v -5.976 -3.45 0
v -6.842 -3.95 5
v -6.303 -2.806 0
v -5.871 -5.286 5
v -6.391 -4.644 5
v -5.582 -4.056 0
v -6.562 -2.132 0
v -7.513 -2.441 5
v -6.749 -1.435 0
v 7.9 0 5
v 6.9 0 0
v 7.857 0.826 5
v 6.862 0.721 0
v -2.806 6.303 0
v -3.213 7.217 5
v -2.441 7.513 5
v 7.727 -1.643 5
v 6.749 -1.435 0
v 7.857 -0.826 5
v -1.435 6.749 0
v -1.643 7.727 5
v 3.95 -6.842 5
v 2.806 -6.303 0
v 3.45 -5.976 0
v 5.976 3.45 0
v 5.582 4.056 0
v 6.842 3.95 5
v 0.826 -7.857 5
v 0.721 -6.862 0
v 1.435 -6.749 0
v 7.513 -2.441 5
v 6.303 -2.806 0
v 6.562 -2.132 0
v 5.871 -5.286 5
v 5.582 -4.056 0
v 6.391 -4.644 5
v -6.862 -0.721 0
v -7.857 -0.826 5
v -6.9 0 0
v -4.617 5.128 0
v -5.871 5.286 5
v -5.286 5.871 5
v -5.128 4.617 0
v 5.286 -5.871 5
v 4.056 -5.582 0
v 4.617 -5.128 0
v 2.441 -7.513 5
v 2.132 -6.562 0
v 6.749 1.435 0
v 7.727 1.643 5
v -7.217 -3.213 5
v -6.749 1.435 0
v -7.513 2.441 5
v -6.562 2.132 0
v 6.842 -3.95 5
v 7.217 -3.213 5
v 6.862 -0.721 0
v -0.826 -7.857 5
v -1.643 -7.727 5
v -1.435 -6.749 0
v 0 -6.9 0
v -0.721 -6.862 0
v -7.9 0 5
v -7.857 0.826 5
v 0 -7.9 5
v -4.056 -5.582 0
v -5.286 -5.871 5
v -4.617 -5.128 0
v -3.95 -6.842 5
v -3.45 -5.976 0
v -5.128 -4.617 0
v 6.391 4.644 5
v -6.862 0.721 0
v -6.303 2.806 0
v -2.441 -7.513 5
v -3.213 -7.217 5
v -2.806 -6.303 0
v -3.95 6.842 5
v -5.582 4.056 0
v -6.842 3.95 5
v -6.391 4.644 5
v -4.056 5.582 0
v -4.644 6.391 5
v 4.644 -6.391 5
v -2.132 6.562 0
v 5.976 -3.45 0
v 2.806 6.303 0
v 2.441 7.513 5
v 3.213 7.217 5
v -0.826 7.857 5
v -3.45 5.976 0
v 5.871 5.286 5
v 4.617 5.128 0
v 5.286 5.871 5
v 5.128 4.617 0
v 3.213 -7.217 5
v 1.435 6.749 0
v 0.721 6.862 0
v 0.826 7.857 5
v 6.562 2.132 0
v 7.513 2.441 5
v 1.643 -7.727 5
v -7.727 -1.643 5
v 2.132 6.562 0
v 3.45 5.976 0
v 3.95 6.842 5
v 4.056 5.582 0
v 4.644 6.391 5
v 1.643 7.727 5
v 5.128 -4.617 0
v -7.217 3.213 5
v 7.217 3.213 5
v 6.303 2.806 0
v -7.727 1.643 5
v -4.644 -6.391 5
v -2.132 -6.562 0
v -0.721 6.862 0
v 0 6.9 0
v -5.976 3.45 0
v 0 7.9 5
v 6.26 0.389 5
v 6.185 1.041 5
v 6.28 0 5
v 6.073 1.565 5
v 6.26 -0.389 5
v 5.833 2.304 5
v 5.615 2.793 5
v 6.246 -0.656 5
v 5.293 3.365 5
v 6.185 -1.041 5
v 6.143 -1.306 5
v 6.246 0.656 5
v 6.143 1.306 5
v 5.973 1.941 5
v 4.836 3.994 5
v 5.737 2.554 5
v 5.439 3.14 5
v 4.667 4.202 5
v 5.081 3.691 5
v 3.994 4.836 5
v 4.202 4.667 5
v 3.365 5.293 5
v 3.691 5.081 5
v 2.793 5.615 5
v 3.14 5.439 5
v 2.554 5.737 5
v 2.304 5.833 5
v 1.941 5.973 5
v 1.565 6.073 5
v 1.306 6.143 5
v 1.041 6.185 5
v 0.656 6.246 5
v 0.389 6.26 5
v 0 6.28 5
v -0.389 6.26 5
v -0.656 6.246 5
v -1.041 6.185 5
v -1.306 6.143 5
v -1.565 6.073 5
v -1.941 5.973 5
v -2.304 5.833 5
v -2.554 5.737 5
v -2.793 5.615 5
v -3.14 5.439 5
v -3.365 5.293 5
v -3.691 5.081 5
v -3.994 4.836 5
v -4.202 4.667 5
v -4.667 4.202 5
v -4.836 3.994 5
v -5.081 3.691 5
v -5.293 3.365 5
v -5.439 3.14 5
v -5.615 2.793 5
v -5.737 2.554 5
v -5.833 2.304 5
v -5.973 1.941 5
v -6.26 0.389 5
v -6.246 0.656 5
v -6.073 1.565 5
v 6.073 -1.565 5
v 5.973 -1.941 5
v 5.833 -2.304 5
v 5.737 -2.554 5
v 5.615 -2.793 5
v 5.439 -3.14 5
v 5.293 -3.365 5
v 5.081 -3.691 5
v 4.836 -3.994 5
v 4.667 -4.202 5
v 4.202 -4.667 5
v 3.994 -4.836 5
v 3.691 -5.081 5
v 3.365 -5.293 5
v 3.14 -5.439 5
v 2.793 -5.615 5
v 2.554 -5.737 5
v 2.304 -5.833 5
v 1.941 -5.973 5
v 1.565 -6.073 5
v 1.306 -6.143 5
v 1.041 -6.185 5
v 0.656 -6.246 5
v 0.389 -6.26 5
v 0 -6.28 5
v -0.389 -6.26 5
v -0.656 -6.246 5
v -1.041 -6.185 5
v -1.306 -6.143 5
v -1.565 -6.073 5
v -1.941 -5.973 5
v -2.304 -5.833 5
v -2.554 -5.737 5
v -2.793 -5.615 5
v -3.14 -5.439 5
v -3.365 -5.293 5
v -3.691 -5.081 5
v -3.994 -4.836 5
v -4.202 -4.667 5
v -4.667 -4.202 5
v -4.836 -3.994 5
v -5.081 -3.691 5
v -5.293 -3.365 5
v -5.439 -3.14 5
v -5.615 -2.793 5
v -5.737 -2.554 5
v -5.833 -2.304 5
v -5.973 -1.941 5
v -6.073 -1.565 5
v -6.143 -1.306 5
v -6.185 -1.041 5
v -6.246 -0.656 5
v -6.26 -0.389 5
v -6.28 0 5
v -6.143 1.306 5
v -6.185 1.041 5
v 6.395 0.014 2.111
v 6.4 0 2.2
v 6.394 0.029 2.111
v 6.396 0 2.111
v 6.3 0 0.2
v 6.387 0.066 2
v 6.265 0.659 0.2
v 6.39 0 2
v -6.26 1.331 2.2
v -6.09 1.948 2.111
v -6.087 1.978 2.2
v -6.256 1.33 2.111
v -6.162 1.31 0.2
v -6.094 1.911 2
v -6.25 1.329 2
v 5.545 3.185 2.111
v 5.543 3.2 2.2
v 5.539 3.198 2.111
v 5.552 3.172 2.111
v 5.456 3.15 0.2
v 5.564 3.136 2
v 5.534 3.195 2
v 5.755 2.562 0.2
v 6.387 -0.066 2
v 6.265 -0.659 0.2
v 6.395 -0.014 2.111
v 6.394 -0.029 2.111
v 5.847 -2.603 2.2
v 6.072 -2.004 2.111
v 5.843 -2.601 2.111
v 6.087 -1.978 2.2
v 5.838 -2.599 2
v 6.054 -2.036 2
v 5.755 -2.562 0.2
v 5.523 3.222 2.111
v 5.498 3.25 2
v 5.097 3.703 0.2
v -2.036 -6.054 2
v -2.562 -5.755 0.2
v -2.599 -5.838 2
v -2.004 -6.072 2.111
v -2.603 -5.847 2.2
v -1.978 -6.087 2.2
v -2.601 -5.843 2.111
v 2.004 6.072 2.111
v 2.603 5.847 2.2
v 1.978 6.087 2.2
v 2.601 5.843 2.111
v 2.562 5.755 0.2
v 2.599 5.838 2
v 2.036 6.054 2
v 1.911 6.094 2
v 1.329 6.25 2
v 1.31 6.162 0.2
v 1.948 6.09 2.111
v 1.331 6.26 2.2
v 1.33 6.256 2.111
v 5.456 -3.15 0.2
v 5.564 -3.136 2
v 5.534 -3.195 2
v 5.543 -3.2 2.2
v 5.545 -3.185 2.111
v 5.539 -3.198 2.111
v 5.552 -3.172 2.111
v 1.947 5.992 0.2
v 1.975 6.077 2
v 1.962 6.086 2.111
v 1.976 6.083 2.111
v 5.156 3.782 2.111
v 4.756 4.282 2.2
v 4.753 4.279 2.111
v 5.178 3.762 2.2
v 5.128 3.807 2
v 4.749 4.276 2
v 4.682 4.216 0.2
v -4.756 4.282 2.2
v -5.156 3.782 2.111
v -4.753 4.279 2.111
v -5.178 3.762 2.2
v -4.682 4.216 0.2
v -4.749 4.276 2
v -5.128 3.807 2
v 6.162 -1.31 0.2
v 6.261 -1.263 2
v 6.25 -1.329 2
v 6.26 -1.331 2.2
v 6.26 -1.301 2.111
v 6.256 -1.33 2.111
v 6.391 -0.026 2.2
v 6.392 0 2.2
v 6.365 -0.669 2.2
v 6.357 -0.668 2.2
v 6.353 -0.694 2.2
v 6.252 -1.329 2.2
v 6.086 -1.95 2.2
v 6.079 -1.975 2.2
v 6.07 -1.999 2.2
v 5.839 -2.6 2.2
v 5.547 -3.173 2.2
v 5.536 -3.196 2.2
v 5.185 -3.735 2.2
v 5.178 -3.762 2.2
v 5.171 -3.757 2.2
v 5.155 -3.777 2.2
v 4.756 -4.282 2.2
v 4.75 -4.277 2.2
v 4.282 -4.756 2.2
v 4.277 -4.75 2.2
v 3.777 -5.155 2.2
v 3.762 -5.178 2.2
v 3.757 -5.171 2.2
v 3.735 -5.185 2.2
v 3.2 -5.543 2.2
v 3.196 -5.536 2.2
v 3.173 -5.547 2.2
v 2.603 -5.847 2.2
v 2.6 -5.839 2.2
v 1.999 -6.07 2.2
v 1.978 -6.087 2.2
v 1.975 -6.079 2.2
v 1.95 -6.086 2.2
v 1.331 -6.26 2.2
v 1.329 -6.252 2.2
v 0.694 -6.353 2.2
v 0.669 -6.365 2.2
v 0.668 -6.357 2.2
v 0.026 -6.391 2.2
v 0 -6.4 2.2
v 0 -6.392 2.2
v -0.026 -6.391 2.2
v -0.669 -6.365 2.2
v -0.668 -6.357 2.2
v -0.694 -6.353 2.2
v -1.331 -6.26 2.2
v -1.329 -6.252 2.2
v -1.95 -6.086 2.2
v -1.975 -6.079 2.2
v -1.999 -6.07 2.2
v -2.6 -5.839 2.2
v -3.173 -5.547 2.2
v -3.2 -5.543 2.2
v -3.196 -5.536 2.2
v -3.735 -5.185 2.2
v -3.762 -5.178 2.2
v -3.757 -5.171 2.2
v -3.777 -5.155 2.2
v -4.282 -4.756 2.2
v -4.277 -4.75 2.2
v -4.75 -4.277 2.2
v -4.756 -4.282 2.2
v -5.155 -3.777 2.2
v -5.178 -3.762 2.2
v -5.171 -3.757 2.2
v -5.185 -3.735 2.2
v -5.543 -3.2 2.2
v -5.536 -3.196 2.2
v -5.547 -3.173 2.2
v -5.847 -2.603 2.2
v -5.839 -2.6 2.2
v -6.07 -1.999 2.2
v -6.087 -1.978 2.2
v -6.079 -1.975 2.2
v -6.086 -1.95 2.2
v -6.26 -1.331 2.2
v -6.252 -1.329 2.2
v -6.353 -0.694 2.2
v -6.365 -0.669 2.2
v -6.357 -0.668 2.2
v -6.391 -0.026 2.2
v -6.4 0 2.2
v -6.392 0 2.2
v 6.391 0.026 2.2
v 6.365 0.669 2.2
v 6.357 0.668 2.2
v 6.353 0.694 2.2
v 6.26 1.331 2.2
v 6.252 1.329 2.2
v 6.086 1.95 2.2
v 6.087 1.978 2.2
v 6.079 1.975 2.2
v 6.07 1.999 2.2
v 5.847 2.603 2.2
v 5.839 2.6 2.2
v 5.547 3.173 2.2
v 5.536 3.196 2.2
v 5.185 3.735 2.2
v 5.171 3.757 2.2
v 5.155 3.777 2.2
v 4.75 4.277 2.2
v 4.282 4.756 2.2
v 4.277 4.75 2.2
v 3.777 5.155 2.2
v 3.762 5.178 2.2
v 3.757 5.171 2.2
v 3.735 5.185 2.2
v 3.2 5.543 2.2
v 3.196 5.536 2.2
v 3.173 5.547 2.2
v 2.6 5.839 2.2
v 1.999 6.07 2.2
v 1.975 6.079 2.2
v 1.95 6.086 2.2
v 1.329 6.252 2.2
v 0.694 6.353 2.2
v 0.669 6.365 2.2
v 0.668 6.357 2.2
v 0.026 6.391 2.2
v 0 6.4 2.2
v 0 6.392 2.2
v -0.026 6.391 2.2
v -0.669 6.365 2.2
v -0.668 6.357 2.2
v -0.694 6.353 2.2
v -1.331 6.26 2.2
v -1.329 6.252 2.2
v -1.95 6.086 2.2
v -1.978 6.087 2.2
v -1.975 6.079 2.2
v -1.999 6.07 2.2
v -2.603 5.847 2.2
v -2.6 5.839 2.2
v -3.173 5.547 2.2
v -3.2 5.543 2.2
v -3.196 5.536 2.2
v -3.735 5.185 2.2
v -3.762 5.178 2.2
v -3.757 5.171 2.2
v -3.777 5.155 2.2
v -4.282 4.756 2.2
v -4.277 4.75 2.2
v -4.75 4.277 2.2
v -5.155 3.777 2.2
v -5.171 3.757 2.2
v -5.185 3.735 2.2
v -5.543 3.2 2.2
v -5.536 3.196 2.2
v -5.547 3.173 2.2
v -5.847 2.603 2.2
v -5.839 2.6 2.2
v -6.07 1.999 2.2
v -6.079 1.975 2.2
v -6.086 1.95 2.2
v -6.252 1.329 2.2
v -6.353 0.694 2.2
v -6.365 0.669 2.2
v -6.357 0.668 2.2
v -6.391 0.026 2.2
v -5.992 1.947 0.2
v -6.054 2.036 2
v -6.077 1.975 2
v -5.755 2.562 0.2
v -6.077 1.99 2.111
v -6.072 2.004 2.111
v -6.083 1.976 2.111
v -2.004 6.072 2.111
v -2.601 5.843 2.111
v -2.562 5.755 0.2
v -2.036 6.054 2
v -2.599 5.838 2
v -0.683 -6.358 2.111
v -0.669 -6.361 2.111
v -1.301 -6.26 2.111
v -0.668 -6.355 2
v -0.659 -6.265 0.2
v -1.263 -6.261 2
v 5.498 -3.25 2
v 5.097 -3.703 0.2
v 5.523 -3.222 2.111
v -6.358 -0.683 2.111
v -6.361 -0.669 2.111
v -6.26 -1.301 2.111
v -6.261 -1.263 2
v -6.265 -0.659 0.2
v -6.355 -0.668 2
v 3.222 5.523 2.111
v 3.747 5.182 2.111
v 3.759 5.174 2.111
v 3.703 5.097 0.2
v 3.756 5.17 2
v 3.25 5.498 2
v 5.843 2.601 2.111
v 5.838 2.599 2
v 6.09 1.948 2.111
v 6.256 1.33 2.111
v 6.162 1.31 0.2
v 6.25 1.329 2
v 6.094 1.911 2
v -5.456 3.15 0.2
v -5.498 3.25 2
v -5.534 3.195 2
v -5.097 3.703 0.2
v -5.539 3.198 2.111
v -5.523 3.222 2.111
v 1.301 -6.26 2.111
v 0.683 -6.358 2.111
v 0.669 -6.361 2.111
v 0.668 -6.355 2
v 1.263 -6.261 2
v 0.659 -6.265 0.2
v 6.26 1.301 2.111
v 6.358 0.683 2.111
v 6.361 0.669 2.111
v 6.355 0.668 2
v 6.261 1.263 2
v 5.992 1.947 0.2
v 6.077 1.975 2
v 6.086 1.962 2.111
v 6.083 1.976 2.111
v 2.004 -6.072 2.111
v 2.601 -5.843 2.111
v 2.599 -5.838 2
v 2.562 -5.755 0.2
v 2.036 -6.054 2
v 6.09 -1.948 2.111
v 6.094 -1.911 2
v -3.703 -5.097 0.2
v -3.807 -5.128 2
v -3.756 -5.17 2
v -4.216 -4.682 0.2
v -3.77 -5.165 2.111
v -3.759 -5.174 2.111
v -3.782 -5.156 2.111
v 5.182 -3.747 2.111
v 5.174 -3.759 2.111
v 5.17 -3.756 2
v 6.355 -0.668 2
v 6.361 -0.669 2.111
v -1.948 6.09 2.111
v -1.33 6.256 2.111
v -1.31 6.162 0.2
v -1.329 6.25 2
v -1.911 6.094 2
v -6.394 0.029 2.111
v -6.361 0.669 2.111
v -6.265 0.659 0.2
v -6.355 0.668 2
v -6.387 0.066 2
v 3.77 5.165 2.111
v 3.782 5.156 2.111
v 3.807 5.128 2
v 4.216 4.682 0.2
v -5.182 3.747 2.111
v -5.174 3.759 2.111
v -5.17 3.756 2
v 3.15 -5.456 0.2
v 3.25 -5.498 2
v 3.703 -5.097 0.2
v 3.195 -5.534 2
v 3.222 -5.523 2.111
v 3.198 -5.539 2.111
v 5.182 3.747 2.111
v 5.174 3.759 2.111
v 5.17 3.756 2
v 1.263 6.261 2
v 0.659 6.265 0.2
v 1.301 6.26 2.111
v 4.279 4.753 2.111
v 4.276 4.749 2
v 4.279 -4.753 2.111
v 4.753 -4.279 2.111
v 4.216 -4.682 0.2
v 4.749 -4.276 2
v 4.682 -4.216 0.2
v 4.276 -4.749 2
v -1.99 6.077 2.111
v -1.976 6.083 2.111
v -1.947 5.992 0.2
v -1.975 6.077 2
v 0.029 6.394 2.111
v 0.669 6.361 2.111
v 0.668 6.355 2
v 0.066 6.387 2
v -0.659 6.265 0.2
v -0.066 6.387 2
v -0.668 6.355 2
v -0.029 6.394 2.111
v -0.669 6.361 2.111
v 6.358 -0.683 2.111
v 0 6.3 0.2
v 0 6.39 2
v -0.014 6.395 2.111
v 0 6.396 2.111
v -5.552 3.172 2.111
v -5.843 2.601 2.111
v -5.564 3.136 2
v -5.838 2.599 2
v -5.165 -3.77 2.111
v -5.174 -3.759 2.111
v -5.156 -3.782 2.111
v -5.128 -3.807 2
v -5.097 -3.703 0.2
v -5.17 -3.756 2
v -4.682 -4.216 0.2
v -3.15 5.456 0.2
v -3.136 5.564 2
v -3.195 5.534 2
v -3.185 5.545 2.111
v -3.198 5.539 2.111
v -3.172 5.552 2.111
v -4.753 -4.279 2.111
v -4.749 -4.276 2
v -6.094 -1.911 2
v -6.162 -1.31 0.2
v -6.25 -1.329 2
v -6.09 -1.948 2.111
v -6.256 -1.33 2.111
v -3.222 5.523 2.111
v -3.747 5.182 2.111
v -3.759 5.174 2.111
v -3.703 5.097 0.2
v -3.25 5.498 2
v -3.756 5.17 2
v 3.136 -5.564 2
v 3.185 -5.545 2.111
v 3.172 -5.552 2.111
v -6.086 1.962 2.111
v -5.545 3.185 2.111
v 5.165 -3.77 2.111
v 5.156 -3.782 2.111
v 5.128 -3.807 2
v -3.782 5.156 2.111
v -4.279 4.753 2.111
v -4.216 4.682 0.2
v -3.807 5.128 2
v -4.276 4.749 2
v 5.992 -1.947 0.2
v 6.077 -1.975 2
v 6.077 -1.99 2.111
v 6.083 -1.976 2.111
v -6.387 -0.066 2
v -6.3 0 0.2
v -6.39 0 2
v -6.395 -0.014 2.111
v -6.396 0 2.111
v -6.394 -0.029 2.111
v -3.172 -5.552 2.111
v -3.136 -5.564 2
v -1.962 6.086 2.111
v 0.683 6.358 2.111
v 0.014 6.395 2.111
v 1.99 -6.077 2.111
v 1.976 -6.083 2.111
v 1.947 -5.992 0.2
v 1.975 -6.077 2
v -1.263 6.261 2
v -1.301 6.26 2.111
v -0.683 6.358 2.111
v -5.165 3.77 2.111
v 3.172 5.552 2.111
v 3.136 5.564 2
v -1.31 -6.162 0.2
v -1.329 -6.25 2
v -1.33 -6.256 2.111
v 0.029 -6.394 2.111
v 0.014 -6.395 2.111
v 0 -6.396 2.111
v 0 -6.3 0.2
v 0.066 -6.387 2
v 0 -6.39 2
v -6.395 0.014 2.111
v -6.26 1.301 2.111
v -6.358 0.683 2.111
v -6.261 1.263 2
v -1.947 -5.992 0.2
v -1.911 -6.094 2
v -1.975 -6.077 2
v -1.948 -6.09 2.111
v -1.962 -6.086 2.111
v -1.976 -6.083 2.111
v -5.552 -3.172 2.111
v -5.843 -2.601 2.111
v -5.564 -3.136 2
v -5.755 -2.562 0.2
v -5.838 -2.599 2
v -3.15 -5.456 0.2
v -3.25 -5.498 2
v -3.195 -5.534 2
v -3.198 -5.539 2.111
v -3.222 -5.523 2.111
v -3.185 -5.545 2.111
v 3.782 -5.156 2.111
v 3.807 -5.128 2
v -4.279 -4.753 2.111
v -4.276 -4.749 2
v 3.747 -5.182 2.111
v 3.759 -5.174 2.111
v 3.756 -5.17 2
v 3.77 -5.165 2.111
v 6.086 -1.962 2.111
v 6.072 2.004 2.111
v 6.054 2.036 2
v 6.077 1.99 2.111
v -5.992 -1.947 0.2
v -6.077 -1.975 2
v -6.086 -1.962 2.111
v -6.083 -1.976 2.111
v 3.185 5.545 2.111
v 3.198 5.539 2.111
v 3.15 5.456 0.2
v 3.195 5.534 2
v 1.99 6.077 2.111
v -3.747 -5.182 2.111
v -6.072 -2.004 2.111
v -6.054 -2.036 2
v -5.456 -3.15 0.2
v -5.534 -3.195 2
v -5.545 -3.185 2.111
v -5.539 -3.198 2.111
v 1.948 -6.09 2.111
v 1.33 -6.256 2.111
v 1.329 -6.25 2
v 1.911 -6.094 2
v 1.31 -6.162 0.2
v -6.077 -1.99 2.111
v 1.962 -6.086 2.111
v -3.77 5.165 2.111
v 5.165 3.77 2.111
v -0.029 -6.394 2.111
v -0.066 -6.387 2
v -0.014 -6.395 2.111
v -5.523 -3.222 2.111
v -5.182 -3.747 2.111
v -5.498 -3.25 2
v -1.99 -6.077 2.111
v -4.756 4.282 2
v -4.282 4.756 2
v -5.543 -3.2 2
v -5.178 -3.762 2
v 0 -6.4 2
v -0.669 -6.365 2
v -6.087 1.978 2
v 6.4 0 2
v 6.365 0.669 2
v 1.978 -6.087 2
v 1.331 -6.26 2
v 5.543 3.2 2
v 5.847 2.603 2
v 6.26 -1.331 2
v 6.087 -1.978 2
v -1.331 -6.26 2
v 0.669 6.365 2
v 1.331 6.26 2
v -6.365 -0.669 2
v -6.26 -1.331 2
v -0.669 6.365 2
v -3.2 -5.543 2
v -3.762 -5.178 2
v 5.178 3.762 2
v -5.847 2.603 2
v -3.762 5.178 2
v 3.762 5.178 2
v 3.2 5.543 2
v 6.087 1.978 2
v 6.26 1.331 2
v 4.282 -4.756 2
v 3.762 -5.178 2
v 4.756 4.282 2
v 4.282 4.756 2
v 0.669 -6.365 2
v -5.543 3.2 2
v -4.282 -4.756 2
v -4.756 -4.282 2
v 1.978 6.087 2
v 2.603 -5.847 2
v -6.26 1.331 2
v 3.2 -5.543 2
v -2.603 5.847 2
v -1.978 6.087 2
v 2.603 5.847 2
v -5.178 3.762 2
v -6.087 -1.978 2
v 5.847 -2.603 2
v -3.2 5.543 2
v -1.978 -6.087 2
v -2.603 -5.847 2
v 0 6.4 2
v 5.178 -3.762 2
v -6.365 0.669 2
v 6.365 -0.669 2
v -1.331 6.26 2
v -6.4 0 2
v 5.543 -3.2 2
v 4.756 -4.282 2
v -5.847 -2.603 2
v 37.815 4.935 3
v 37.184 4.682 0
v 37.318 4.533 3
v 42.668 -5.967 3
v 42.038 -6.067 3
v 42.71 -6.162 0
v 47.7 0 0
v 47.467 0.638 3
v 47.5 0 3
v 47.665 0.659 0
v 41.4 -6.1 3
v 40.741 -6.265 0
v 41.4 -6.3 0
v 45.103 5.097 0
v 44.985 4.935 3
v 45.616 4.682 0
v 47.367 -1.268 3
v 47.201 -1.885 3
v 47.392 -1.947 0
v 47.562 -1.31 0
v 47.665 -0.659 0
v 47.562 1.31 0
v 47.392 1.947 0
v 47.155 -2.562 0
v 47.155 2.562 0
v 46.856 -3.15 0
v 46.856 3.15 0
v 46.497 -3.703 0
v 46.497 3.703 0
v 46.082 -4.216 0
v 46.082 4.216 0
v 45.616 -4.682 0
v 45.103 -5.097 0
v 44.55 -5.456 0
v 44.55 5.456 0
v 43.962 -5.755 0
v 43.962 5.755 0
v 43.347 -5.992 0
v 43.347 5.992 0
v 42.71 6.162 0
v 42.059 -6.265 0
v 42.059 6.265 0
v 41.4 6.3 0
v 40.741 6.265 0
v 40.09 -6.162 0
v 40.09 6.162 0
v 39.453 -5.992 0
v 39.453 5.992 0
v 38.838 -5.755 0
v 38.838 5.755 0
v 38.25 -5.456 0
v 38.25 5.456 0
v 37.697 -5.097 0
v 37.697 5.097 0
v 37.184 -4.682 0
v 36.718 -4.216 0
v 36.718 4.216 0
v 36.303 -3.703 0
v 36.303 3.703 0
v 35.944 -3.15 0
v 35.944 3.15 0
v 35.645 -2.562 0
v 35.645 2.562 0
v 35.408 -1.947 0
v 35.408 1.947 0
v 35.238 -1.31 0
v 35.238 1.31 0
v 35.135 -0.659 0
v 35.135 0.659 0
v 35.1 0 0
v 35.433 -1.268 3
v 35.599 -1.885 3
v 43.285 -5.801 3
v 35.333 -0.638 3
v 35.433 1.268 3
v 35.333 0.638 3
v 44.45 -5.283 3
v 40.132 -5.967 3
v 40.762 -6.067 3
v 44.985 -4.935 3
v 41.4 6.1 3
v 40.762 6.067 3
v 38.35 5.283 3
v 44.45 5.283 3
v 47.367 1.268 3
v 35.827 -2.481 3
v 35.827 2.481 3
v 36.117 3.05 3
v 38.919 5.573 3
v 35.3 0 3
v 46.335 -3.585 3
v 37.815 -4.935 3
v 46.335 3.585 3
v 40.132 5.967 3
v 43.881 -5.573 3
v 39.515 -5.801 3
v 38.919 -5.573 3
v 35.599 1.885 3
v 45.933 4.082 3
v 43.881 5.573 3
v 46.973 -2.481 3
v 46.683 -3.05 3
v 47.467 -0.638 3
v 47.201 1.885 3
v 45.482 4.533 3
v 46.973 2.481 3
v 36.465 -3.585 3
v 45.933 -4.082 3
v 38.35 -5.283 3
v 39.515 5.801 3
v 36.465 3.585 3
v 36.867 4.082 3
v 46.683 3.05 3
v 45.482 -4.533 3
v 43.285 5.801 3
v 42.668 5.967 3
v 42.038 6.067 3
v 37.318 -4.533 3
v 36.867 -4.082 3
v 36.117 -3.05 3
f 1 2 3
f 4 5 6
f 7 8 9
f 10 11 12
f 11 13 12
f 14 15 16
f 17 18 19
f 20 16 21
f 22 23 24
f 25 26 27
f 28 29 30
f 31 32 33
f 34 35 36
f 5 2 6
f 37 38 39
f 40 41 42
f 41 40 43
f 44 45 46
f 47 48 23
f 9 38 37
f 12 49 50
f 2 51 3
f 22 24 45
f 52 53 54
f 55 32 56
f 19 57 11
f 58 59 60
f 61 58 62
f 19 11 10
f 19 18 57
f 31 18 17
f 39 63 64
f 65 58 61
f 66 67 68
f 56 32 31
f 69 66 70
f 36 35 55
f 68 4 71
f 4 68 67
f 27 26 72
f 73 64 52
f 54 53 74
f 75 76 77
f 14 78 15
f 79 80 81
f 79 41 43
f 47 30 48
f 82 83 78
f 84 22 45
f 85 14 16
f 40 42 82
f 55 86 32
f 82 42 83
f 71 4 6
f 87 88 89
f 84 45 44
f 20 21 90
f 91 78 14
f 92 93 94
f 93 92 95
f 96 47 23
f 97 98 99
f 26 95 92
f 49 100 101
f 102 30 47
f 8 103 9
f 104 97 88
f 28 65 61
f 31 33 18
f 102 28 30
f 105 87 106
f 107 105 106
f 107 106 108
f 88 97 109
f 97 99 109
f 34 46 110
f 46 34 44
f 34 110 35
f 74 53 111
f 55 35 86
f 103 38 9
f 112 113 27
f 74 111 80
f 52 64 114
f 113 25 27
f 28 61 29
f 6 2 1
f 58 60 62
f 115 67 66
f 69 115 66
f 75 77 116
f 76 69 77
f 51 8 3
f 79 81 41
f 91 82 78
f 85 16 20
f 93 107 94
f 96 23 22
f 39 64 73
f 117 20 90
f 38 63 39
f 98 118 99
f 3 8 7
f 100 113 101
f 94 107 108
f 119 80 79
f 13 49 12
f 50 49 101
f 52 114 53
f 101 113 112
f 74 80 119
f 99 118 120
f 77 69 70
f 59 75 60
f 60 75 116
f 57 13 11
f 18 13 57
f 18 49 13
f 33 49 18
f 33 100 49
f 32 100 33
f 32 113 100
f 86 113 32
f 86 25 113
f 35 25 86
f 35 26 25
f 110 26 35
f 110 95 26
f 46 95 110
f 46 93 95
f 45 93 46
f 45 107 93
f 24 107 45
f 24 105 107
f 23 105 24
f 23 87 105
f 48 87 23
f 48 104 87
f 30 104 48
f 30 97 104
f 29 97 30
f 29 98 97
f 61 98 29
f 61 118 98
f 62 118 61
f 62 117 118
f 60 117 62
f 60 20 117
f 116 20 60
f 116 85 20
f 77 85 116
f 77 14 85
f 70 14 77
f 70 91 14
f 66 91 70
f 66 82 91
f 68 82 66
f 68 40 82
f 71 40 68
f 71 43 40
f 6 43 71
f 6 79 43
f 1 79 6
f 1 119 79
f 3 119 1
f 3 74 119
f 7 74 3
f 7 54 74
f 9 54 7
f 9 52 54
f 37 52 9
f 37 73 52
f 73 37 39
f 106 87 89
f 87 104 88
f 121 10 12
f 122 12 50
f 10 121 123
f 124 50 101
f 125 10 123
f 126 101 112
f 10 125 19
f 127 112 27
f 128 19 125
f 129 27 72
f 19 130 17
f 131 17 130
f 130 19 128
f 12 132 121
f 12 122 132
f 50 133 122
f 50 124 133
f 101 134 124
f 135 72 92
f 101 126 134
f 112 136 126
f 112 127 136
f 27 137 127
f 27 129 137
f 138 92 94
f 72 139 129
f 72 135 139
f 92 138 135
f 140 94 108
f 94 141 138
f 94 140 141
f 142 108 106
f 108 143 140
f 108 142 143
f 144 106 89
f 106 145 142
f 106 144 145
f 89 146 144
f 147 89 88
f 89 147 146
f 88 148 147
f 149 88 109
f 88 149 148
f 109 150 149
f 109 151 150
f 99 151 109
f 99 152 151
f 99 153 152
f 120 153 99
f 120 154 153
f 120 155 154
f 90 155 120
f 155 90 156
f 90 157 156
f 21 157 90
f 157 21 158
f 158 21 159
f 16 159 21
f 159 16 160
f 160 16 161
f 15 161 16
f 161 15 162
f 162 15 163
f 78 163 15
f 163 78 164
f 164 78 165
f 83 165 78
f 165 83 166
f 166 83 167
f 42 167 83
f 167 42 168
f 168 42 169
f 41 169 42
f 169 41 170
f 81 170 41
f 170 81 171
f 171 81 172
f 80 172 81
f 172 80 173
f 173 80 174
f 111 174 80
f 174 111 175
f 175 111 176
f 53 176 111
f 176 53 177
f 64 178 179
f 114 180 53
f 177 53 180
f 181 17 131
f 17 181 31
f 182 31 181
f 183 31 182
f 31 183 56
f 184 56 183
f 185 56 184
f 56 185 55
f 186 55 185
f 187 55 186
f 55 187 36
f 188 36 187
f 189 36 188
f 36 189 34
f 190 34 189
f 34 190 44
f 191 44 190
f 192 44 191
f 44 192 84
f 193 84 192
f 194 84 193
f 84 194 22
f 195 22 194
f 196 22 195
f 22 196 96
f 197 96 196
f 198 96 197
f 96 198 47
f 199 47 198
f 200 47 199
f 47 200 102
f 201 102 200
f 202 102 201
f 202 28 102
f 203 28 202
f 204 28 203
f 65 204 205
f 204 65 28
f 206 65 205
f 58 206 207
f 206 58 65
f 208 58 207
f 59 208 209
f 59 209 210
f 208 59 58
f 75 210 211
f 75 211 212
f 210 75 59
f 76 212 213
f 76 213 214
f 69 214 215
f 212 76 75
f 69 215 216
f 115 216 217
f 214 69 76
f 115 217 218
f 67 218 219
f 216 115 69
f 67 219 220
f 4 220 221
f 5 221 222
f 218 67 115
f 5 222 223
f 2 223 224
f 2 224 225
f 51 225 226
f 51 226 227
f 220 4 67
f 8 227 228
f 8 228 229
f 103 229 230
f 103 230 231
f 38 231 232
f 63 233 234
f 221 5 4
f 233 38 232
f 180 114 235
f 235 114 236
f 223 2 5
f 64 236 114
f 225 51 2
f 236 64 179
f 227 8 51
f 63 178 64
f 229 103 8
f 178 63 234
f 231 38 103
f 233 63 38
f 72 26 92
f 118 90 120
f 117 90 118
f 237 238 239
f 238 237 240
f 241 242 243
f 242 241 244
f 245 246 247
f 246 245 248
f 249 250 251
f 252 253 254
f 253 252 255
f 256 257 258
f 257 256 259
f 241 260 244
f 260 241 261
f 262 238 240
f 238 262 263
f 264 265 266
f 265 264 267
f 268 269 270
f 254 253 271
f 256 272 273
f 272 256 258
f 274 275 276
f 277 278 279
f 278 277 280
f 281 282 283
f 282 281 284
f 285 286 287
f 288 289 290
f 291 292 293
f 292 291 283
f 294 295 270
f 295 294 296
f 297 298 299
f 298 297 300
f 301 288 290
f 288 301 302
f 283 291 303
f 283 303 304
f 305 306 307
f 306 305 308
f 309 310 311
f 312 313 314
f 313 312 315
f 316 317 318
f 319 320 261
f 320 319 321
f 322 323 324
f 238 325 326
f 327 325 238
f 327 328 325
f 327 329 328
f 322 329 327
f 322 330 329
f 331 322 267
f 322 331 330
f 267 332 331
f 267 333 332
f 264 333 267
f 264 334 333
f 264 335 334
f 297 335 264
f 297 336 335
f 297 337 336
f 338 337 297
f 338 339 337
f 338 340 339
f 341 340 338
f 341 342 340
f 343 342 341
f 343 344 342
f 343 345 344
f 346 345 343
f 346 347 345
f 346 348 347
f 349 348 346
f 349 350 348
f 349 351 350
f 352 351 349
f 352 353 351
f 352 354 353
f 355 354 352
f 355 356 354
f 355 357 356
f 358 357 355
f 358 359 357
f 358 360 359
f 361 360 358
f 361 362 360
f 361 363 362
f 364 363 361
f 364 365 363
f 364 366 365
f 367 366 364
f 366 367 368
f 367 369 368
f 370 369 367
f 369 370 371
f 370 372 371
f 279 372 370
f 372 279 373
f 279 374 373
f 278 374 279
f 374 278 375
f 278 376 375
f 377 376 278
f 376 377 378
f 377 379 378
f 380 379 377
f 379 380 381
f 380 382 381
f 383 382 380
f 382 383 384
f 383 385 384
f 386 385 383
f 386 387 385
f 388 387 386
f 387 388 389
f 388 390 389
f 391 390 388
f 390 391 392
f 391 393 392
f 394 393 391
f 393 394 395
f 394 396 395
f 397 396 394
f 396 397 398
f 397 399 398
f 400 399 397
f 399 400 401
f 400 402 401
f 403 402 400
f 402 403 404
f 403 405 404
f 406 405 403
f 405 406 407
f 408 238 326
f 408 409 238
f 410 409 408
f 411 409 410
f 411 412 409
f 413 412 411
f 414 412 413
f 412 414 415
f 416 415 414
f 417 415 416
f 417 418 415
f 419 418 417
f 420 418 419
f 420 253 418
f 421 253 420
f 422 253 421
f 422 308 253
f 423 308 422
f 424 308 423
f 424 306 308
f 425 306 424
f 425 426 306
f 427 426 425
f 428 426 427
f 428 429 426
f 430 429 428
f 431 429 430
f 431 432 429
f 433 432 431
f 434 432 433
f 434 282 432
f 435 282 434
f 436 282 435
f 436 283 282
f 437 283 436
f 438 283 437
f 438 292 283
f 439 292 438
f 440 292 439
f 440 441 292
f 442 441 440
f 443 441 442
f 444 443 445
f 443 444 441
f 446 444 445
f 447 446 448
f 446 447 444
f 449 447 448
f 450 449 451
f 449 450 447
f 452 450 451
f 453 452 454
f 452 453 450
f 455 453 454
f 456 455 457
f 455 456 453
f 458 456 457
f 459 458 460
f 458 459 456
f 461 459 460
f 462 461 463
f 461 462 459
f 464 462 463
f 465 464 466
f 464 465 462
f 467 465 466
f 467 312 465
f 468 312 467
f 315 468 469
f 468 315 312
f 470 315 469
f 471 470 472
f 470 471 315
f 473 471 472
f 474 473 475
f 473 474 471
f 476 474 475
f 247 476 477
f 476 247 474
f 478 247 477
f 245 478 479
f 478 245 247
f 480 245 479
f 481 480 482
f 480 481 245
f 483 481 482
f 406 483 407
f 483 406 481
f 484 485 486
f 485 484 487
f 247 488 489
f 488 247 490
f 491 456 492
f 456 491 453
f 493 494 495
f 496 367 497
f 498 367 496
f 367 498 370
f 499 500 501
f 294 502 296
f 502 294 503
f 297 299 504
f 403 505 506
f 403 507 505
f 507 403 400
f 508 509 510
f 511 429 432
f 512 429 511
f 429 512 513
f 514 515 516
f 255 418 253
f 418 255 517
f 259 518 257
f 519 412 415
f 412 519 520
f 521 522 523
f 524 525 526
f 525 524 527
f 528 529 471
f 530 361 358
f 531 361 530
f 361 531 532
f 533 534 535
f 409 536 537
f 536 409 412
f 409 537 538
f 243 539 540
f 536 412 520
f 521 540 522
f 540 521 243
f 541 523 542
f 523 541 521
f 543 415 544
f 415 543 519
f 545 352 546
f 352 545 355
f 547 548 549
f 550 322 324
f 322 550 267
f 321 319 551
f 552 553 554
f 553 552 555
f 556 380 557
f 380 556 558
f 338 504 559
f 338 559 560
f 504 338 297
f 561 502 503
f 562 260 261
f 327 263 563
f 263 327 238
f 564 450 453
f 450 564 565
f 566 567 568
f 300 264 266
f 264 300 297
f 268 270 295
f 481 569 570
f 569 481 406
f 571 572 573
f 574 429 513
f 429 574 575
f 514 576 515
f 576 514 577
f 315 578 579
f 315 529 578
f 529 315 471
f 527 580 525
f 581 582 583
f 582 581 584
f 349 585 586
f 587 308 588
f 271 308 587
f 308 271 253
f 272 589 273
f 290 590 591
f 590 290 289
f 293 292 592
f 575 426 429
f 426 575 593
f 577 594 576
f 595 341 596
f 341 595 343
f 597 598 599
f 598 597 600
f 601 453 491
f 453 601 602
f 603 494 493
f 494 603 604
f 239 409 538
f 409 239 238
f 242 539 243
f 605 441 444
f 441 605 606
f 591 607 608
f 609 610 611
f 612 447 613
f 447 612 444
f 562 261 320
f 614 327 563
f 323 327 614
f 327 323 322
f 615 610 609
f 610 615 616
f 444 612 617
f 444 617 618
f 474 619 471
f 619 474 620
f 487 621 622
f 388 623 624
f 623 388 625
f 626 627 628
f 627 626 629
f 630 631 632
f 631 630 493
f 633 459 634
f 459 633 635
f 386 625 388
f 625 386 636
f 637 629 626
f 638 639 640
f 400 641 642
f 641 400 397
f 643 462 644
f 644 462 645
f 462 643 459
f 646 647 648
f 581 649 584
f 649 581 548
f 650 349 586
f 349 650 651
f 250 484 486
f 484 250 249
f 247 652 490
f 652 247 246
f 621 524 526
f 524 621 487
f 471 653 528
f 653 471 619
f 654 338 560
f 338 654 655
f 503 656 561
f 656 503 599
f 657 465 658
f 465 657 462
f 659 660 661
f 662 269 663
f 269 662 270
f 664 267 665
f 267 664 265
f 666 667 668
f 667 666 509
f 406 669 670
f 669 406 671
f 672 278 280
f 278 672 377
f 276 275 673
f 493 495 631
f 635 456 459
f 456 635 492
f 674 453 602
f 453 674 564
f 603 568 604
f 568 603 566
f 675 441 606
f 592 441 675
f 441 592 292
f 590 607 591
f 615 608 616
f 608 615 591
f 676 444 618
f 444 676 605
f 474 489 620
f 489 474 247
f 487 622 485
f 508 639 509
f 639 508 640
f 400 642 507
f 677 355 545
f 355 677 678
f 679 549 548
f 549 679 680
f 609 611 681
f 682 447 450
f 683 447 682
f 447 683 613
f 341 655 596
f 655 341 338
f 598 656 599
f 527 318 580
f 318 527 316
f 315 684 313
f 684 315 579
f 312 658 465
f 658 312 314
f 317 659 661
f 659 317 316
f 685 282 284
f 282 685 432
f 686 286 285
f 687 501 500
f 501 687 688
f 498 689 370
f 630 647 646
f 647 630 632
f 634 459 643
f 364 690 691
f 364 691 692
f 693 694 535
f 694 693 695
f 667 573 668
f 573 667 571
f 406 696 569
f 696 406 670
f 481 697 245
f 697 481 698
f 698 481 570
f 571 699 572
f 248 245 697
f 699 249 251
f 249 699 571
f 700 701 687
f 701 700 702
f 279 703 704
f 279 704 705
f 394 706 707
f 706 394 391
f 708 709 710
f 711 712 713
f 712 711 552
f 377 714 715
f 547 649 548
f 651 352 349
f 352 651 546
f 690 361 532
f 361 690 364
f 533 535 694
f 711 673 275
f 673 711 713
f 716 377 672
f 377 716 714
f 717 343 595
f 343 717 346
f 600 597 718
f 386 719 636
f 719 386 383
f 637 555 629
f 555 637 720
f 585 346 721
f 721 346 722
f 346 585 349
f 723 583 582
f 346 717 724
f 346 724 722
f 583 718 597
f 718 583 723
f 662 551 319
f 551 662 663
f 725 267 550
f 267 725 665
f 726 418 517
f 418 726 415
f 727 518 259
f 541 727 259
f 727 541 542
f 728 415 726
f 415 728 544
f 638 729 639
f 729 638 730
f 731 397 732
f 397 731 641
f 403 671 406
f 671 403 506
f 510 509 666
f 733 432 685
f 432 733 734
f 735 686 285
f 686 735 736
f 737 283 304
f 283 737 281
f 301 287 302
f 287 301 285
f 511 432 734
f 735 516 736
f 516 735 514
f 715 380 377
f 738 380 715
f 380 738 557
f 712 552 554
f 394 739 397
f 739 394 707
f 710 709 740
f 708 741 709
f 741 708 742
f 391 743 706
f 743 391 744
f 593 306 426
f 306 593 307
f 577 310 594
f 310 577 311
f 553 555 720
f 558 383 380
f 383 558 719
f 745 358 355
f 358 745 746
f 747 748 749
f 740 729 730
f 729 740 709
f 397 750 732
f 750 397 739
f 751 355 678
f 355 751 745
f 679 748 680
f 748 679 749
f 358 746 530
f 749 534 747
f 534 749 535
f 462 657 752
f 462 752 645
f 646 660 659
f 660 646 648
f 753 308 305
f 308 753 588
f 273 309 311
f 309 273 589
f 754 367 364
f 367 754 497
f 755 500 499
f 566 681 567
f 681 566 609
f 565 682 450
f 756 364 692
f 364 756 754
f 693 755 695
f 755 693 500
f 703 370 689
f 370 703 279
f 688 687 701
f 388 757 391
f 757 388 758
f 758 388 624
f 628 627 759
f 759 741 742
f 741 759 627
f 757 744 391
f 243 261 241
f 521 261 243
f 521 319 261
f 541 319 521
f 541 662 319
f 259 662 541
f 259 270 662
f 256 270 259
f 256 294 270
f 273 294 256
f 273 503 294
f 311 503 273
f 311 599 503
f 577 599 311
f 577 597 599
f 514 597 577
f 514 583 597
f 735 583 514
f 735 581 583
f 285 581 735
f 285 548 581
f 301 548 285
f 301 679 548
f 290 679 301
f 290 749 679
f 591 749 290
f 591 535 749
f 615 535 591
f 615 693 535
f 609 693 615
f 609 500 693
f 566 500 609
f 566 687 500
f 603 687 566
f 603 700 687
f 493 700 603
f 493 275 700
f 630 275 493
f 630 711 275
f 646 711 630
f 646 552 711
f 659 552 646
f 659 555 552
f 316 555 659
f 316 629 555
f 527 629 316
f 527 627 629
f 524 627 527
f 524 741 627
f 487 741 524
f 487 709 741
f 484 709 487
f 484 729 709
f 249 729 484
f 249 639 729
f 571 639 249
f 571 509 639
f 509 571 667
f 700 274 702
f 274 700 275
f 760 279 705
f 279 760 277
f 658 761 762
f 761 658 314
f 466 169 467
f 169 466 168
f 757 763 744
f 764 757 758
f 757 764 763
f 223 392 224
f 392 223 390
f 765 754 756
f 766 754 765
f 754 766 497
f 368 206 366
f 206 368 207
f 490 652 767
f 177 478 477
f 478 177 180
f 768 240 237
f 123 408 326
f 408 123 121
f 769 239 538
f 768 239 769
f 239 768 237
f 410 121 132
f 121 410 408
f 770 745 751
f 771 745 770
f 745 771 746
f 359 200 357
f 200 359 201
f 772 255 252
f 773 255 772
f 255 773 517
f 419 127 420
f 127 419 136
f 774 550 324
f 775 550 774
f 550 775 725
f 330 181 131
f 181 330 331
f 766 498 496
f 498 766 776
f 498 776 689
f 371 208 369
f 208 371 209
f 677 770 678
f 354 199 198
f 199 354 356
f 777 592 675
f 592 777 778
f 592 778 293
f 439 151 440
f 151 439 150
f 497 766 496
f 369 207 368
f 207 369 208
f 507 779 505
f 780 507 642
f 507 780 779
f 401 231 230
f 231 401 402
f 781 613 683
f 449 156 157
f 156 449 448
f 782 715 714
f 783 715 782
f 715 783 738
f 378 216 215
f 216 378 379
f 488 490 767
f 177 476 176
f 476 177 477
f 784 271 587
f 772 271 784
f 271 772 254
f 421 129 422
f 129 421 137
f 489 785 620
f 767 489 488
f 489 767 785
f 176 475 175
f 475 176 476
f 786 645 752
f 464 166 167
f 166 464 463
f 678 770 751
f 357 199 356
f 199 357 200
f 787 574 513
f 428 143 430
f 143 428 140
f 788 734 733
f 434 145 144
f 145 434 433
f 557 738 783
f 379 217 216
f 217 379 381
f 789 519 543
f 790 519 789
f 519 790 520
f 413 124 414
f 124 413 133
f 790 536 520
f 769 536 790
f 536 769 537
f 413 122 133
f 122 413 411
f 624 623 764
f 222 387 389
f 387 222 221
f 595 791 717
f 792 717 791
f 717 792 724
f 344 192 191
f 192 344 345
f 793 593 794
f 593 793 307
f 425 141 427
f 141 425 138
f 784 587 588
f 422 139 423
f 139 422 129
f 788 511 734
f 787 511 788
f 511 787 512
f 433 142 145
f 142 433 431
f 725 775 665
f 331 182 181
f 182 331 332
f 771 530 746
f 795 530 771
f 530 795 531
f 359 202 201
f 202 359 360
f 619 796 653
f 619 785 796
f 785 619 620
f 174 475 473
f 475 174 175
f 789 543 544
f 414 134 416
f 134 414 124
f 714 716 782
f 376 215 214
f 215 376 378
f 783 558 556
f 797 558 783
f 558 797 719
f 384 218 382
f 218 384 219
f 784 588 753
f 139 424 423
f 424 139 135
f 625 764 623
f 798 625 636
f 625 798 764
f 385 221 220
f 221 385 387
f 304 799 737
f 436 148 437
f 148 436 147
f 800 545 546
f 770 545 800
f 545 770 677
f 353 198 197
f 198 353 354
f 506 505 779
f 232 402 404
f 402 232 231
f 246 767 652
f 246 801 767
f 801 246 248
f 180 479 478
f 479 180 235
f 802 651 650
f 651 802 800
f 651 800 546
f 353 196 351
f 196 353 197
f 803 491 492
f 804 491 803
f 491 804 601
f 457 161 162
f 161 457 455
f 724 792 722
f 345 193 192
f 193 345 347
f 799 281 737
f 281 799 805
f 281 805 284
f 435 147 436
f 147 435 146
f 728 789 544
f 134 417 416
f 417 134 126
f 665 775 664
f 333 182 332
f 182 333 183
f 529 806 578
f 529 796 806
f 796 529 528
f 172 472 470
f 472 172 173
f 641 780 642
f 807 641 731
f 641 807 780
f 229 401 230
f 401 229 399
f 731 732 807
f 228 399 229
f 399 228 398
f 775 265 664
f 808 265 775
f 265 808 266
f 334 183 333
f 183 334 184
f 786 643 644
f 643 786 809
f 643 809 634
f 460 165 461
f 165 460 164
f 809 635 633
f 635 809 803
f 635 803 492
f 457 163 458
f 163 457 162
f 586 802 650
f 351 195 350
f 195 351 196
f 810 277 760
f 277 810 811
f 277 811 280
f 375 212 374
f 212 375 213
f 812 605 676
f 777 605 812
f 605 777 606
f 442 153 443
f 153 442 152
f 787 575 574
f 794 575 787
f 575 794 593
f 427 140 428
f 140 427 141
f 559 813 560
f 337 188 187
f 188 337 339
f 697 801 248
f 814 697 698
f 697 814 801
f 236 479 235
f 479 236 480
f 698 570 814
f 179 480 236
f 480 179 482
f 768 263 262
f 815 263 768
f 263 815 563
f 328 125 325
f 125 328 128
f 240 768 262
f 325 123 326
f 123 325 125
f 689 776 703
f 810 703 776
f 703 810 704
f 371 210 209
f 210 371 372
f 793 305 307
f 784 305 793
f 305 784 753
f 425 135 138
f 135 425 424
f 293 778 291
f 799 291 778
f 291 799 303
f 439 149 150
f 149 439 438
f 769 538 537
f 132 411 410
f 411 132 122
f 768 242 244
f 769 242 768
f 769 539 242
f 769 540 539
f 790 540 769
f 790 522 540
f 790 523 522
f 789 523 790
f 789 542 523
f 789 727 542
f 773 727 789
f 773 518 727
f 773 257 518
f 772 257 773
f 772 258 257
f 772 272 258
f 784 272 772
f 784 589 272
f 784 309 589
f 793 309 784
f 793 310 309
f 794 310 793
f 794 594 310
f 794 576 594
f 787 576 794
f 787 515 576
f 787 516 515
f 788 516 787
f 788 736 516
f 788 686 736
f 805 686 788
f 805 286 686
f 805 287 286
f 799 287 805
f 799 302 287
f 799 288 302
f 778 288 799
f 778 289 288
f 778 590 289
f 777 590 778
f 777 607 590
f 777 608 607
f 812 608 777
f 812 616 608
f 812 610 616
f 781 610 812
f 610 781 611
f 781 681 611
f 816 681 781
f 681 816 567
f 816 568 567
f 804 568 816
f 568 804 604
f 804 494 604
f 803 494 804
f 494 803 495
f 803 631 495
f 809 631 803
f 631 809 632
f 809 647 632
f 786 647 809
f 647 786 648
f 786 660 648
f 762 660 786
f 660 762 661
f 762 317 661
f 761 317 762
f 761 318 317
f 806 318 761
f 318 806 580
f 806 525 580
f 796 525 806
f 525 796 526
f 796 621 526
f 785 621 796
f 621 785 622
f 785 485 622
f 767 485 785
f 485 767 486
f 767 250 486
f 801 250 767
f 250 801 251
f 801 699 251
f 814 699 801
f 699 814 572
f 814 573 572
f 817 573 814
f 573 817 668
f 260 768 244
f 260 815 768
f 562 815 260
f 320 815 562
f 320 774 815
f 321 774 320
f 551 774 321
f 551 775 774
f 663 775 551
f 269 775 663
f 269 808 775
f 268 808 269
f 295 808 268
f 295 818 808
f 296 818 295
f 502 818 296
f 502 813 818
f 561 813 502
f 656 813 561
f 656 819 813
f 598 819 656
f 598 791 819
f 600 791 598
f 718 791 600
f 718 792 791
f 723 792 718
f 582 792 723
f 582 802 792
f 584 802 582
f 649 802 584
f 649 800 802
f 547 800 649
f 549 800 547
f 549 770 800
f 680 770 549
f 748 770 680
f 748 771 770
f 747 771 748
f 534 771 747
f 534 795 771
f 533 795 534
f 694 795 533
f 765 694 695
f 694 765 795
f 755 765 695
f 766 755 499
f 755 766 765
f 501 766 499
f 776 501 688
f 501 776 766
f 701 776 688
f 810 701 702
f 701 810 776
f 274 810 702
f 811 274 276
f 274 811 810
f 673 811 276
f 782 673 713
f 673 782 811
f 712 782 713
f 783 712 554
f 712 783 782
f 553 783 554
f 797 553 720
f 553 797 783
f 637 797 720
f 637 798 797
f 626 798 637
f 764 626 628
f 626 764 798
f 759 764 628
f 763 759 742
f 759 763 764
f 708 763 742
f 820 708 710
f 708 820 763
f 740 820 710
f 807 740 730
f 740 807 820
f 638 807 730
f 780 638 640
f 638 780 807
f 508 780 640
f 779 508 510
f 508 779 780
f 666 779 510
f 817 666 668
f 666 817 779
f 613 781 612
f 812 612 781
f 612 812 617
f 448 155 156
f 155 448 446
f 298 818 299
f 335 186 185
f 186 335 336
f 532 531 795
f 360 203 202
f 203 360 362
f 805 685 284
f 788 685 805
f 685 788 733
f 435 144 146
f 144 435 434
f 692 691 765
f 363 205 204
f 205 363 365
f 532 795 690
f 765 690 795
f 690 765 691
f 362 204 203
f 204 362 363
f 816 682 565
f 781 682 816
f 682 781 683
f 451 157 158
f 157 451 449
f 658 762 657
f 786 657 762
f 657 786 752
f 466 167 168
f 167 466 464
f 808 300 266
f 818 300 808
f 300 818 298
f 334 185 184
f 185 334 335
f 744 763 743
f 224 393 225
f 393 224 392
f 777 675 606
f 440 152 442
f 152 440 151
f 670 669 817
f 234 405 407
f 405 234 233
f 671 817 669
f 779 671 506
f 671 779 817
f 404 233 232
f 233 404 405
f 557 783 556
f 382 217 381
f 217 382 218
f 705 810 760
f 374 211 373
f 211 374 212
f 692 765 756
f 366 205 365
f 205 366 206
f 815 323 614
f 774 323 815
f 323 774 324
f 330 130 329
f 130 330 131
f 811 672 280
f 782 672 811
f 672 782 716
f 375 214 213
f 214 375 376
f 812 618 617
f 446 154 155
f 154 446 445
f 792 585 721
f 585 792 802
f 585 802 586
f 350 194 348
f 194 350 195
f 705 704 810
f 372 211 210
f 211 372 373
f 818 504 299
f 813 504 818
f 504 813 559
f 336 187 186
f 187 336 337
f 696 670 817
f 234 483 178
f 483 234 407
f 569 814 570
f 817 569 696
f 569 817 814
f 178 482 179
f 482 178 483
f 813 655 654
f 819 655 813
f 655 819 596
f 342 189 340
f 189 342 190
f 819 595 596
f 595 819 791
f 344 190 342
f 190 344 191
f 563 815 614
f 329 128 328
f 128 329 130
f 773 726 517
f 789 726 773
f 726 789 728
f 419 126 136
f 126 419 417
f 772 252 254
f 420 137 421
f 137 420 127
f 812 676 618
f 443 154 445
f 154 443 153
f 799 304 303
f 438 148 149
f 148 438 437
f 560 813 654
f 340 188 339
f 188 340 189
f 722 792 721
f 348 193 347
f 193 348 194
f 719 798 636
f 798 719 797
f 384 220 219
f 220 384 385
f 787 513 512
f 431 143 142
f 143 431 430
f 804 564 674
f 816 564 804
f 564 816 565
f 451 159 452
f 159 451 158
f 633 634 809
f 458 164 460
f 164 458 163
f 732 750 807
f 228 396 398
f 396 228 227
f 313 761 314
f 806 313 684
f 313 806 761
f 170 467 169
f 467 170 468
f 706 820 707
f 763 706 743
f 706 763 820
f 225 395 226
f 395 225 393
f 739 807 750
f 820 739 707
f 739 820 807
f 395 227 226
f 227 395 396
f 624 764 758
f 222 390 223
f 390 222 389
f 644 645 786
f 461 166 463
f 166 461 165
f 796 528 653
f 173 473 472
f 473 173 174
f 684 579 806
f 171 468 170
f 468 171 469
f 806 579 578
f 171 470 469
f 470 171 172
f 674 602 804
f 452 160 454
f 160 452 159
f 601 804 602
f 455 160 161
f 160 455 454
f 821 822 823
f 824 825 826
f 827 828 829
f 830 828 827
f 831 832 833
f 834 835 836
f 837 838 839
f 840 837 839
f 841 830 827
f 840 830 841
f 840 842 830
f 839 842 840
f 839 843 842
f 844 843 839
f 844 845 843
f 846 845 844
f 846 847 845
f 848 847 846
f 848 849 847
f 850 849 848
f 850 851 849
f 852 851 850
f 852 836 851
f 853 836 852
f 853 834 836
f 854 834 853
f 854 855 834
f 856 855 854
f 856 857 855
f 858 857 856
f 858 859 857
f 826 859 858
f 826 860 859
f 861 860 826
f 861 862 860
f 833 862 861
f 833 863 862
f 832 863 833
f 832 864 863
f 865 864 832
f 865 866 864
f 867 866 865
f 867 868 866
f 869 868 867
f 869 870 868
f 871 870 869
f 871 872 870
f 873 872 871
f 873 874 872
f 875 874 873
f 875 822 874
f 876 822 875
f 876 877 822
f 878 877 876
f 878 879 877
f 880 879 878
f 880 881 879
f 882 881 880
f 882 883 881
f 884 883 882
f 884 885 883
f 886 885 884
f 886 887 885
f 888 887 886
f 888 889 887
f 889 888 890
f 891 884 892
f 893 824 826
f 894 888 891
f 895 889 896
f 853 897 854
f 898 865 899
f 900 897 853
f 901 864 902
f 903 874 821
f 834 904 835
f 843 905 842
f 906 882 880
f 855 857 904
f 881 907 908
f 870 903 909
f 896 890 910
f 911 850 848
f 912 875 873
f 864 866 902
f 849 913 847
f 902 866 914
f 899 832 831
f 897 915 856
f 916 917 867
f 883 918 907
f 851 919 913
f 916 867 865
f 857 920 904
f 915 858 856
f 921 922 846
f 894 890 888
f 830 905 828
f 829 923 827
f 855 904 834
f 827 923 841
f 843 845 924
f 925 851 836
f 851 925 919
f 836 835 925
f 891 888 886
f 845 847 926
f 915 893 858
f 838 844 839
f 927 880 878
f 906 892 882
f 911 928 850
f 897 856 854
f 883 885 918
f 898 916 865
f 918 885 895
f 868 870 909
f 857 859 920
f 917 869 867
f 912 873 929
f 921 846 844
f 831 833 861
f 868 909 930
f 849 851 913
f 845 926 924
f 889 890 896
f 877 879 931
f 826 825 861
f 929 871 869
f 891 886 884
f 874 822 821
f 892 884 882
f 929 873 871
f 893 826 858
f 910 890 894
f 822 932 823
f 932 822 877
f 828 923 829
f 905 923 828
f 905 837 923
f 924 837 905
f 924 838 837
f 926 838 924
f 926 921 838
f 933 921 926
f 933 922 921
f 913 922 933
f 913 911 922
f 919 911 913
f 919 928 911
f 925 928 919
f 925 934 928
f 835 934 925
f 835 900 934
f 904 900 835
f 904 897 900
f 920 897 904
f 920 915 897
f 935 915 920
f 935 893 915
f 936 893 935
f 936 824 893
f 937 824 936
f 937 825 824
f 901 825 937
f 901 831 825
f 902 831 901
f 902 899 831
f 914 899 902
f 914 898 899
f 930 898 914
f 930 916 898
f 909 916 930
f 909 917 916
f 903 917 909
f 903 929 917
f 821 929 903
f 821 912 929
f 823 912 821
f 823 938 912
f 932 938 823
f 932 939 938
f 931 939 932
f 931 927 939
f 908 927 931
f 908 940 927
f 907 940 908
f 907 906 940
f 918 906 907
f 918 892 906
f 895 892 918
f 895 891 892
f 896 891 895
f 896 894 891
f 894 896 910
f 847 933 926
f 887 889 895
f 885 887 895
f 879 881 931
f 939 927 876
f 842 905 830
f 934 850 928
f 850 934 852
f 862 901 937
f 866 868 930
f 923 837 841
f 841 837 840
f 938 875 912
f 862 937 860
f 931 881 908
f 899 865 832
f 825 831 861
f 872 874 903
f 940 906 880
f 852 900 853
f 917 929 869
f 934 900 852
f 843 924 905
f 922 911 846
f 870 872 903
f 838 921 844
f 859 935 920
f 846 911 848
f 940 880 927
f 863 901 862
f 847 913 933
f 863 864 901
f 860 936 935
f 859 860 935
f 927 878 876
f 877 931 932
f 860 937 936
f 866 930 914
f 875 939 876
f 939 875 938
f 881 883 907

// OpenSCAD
// I found magnets of these sizes in my magnet collection:
// 12.6 x 1.6
// 9.6 1.5

// Diameter of magnet disk
magnet = 12.6; 
// thickness of magnet disk
magneth = 1.6;
// handle height
h = 5;
// layer thickness of bottom
layer = 0.2;

/* [extras] */
// fit tolerance for the magnet
tol = 0.2;
// diameter change bottom to top
taper = 2;
dia = magnet+0.4*3;;

/* [hidden] */
$fn = 60;
difference() {
    cylinder(h=h, d1=dia, d2=dia+taper);
    translate([0,0,layer])cylinder(h=magneth+layer*2, d1=magnet, d2=magnet+tol);
    translate([0,0,magneth+layer*2]) cylinder(h=h, d1=magnet+tol, d2=magnet-tol);
}

// plug
translate([dia*3,0,0]) cylinder(h=h-magneth-layer*2, d1=magnet, d2=magnet-tol*2);
